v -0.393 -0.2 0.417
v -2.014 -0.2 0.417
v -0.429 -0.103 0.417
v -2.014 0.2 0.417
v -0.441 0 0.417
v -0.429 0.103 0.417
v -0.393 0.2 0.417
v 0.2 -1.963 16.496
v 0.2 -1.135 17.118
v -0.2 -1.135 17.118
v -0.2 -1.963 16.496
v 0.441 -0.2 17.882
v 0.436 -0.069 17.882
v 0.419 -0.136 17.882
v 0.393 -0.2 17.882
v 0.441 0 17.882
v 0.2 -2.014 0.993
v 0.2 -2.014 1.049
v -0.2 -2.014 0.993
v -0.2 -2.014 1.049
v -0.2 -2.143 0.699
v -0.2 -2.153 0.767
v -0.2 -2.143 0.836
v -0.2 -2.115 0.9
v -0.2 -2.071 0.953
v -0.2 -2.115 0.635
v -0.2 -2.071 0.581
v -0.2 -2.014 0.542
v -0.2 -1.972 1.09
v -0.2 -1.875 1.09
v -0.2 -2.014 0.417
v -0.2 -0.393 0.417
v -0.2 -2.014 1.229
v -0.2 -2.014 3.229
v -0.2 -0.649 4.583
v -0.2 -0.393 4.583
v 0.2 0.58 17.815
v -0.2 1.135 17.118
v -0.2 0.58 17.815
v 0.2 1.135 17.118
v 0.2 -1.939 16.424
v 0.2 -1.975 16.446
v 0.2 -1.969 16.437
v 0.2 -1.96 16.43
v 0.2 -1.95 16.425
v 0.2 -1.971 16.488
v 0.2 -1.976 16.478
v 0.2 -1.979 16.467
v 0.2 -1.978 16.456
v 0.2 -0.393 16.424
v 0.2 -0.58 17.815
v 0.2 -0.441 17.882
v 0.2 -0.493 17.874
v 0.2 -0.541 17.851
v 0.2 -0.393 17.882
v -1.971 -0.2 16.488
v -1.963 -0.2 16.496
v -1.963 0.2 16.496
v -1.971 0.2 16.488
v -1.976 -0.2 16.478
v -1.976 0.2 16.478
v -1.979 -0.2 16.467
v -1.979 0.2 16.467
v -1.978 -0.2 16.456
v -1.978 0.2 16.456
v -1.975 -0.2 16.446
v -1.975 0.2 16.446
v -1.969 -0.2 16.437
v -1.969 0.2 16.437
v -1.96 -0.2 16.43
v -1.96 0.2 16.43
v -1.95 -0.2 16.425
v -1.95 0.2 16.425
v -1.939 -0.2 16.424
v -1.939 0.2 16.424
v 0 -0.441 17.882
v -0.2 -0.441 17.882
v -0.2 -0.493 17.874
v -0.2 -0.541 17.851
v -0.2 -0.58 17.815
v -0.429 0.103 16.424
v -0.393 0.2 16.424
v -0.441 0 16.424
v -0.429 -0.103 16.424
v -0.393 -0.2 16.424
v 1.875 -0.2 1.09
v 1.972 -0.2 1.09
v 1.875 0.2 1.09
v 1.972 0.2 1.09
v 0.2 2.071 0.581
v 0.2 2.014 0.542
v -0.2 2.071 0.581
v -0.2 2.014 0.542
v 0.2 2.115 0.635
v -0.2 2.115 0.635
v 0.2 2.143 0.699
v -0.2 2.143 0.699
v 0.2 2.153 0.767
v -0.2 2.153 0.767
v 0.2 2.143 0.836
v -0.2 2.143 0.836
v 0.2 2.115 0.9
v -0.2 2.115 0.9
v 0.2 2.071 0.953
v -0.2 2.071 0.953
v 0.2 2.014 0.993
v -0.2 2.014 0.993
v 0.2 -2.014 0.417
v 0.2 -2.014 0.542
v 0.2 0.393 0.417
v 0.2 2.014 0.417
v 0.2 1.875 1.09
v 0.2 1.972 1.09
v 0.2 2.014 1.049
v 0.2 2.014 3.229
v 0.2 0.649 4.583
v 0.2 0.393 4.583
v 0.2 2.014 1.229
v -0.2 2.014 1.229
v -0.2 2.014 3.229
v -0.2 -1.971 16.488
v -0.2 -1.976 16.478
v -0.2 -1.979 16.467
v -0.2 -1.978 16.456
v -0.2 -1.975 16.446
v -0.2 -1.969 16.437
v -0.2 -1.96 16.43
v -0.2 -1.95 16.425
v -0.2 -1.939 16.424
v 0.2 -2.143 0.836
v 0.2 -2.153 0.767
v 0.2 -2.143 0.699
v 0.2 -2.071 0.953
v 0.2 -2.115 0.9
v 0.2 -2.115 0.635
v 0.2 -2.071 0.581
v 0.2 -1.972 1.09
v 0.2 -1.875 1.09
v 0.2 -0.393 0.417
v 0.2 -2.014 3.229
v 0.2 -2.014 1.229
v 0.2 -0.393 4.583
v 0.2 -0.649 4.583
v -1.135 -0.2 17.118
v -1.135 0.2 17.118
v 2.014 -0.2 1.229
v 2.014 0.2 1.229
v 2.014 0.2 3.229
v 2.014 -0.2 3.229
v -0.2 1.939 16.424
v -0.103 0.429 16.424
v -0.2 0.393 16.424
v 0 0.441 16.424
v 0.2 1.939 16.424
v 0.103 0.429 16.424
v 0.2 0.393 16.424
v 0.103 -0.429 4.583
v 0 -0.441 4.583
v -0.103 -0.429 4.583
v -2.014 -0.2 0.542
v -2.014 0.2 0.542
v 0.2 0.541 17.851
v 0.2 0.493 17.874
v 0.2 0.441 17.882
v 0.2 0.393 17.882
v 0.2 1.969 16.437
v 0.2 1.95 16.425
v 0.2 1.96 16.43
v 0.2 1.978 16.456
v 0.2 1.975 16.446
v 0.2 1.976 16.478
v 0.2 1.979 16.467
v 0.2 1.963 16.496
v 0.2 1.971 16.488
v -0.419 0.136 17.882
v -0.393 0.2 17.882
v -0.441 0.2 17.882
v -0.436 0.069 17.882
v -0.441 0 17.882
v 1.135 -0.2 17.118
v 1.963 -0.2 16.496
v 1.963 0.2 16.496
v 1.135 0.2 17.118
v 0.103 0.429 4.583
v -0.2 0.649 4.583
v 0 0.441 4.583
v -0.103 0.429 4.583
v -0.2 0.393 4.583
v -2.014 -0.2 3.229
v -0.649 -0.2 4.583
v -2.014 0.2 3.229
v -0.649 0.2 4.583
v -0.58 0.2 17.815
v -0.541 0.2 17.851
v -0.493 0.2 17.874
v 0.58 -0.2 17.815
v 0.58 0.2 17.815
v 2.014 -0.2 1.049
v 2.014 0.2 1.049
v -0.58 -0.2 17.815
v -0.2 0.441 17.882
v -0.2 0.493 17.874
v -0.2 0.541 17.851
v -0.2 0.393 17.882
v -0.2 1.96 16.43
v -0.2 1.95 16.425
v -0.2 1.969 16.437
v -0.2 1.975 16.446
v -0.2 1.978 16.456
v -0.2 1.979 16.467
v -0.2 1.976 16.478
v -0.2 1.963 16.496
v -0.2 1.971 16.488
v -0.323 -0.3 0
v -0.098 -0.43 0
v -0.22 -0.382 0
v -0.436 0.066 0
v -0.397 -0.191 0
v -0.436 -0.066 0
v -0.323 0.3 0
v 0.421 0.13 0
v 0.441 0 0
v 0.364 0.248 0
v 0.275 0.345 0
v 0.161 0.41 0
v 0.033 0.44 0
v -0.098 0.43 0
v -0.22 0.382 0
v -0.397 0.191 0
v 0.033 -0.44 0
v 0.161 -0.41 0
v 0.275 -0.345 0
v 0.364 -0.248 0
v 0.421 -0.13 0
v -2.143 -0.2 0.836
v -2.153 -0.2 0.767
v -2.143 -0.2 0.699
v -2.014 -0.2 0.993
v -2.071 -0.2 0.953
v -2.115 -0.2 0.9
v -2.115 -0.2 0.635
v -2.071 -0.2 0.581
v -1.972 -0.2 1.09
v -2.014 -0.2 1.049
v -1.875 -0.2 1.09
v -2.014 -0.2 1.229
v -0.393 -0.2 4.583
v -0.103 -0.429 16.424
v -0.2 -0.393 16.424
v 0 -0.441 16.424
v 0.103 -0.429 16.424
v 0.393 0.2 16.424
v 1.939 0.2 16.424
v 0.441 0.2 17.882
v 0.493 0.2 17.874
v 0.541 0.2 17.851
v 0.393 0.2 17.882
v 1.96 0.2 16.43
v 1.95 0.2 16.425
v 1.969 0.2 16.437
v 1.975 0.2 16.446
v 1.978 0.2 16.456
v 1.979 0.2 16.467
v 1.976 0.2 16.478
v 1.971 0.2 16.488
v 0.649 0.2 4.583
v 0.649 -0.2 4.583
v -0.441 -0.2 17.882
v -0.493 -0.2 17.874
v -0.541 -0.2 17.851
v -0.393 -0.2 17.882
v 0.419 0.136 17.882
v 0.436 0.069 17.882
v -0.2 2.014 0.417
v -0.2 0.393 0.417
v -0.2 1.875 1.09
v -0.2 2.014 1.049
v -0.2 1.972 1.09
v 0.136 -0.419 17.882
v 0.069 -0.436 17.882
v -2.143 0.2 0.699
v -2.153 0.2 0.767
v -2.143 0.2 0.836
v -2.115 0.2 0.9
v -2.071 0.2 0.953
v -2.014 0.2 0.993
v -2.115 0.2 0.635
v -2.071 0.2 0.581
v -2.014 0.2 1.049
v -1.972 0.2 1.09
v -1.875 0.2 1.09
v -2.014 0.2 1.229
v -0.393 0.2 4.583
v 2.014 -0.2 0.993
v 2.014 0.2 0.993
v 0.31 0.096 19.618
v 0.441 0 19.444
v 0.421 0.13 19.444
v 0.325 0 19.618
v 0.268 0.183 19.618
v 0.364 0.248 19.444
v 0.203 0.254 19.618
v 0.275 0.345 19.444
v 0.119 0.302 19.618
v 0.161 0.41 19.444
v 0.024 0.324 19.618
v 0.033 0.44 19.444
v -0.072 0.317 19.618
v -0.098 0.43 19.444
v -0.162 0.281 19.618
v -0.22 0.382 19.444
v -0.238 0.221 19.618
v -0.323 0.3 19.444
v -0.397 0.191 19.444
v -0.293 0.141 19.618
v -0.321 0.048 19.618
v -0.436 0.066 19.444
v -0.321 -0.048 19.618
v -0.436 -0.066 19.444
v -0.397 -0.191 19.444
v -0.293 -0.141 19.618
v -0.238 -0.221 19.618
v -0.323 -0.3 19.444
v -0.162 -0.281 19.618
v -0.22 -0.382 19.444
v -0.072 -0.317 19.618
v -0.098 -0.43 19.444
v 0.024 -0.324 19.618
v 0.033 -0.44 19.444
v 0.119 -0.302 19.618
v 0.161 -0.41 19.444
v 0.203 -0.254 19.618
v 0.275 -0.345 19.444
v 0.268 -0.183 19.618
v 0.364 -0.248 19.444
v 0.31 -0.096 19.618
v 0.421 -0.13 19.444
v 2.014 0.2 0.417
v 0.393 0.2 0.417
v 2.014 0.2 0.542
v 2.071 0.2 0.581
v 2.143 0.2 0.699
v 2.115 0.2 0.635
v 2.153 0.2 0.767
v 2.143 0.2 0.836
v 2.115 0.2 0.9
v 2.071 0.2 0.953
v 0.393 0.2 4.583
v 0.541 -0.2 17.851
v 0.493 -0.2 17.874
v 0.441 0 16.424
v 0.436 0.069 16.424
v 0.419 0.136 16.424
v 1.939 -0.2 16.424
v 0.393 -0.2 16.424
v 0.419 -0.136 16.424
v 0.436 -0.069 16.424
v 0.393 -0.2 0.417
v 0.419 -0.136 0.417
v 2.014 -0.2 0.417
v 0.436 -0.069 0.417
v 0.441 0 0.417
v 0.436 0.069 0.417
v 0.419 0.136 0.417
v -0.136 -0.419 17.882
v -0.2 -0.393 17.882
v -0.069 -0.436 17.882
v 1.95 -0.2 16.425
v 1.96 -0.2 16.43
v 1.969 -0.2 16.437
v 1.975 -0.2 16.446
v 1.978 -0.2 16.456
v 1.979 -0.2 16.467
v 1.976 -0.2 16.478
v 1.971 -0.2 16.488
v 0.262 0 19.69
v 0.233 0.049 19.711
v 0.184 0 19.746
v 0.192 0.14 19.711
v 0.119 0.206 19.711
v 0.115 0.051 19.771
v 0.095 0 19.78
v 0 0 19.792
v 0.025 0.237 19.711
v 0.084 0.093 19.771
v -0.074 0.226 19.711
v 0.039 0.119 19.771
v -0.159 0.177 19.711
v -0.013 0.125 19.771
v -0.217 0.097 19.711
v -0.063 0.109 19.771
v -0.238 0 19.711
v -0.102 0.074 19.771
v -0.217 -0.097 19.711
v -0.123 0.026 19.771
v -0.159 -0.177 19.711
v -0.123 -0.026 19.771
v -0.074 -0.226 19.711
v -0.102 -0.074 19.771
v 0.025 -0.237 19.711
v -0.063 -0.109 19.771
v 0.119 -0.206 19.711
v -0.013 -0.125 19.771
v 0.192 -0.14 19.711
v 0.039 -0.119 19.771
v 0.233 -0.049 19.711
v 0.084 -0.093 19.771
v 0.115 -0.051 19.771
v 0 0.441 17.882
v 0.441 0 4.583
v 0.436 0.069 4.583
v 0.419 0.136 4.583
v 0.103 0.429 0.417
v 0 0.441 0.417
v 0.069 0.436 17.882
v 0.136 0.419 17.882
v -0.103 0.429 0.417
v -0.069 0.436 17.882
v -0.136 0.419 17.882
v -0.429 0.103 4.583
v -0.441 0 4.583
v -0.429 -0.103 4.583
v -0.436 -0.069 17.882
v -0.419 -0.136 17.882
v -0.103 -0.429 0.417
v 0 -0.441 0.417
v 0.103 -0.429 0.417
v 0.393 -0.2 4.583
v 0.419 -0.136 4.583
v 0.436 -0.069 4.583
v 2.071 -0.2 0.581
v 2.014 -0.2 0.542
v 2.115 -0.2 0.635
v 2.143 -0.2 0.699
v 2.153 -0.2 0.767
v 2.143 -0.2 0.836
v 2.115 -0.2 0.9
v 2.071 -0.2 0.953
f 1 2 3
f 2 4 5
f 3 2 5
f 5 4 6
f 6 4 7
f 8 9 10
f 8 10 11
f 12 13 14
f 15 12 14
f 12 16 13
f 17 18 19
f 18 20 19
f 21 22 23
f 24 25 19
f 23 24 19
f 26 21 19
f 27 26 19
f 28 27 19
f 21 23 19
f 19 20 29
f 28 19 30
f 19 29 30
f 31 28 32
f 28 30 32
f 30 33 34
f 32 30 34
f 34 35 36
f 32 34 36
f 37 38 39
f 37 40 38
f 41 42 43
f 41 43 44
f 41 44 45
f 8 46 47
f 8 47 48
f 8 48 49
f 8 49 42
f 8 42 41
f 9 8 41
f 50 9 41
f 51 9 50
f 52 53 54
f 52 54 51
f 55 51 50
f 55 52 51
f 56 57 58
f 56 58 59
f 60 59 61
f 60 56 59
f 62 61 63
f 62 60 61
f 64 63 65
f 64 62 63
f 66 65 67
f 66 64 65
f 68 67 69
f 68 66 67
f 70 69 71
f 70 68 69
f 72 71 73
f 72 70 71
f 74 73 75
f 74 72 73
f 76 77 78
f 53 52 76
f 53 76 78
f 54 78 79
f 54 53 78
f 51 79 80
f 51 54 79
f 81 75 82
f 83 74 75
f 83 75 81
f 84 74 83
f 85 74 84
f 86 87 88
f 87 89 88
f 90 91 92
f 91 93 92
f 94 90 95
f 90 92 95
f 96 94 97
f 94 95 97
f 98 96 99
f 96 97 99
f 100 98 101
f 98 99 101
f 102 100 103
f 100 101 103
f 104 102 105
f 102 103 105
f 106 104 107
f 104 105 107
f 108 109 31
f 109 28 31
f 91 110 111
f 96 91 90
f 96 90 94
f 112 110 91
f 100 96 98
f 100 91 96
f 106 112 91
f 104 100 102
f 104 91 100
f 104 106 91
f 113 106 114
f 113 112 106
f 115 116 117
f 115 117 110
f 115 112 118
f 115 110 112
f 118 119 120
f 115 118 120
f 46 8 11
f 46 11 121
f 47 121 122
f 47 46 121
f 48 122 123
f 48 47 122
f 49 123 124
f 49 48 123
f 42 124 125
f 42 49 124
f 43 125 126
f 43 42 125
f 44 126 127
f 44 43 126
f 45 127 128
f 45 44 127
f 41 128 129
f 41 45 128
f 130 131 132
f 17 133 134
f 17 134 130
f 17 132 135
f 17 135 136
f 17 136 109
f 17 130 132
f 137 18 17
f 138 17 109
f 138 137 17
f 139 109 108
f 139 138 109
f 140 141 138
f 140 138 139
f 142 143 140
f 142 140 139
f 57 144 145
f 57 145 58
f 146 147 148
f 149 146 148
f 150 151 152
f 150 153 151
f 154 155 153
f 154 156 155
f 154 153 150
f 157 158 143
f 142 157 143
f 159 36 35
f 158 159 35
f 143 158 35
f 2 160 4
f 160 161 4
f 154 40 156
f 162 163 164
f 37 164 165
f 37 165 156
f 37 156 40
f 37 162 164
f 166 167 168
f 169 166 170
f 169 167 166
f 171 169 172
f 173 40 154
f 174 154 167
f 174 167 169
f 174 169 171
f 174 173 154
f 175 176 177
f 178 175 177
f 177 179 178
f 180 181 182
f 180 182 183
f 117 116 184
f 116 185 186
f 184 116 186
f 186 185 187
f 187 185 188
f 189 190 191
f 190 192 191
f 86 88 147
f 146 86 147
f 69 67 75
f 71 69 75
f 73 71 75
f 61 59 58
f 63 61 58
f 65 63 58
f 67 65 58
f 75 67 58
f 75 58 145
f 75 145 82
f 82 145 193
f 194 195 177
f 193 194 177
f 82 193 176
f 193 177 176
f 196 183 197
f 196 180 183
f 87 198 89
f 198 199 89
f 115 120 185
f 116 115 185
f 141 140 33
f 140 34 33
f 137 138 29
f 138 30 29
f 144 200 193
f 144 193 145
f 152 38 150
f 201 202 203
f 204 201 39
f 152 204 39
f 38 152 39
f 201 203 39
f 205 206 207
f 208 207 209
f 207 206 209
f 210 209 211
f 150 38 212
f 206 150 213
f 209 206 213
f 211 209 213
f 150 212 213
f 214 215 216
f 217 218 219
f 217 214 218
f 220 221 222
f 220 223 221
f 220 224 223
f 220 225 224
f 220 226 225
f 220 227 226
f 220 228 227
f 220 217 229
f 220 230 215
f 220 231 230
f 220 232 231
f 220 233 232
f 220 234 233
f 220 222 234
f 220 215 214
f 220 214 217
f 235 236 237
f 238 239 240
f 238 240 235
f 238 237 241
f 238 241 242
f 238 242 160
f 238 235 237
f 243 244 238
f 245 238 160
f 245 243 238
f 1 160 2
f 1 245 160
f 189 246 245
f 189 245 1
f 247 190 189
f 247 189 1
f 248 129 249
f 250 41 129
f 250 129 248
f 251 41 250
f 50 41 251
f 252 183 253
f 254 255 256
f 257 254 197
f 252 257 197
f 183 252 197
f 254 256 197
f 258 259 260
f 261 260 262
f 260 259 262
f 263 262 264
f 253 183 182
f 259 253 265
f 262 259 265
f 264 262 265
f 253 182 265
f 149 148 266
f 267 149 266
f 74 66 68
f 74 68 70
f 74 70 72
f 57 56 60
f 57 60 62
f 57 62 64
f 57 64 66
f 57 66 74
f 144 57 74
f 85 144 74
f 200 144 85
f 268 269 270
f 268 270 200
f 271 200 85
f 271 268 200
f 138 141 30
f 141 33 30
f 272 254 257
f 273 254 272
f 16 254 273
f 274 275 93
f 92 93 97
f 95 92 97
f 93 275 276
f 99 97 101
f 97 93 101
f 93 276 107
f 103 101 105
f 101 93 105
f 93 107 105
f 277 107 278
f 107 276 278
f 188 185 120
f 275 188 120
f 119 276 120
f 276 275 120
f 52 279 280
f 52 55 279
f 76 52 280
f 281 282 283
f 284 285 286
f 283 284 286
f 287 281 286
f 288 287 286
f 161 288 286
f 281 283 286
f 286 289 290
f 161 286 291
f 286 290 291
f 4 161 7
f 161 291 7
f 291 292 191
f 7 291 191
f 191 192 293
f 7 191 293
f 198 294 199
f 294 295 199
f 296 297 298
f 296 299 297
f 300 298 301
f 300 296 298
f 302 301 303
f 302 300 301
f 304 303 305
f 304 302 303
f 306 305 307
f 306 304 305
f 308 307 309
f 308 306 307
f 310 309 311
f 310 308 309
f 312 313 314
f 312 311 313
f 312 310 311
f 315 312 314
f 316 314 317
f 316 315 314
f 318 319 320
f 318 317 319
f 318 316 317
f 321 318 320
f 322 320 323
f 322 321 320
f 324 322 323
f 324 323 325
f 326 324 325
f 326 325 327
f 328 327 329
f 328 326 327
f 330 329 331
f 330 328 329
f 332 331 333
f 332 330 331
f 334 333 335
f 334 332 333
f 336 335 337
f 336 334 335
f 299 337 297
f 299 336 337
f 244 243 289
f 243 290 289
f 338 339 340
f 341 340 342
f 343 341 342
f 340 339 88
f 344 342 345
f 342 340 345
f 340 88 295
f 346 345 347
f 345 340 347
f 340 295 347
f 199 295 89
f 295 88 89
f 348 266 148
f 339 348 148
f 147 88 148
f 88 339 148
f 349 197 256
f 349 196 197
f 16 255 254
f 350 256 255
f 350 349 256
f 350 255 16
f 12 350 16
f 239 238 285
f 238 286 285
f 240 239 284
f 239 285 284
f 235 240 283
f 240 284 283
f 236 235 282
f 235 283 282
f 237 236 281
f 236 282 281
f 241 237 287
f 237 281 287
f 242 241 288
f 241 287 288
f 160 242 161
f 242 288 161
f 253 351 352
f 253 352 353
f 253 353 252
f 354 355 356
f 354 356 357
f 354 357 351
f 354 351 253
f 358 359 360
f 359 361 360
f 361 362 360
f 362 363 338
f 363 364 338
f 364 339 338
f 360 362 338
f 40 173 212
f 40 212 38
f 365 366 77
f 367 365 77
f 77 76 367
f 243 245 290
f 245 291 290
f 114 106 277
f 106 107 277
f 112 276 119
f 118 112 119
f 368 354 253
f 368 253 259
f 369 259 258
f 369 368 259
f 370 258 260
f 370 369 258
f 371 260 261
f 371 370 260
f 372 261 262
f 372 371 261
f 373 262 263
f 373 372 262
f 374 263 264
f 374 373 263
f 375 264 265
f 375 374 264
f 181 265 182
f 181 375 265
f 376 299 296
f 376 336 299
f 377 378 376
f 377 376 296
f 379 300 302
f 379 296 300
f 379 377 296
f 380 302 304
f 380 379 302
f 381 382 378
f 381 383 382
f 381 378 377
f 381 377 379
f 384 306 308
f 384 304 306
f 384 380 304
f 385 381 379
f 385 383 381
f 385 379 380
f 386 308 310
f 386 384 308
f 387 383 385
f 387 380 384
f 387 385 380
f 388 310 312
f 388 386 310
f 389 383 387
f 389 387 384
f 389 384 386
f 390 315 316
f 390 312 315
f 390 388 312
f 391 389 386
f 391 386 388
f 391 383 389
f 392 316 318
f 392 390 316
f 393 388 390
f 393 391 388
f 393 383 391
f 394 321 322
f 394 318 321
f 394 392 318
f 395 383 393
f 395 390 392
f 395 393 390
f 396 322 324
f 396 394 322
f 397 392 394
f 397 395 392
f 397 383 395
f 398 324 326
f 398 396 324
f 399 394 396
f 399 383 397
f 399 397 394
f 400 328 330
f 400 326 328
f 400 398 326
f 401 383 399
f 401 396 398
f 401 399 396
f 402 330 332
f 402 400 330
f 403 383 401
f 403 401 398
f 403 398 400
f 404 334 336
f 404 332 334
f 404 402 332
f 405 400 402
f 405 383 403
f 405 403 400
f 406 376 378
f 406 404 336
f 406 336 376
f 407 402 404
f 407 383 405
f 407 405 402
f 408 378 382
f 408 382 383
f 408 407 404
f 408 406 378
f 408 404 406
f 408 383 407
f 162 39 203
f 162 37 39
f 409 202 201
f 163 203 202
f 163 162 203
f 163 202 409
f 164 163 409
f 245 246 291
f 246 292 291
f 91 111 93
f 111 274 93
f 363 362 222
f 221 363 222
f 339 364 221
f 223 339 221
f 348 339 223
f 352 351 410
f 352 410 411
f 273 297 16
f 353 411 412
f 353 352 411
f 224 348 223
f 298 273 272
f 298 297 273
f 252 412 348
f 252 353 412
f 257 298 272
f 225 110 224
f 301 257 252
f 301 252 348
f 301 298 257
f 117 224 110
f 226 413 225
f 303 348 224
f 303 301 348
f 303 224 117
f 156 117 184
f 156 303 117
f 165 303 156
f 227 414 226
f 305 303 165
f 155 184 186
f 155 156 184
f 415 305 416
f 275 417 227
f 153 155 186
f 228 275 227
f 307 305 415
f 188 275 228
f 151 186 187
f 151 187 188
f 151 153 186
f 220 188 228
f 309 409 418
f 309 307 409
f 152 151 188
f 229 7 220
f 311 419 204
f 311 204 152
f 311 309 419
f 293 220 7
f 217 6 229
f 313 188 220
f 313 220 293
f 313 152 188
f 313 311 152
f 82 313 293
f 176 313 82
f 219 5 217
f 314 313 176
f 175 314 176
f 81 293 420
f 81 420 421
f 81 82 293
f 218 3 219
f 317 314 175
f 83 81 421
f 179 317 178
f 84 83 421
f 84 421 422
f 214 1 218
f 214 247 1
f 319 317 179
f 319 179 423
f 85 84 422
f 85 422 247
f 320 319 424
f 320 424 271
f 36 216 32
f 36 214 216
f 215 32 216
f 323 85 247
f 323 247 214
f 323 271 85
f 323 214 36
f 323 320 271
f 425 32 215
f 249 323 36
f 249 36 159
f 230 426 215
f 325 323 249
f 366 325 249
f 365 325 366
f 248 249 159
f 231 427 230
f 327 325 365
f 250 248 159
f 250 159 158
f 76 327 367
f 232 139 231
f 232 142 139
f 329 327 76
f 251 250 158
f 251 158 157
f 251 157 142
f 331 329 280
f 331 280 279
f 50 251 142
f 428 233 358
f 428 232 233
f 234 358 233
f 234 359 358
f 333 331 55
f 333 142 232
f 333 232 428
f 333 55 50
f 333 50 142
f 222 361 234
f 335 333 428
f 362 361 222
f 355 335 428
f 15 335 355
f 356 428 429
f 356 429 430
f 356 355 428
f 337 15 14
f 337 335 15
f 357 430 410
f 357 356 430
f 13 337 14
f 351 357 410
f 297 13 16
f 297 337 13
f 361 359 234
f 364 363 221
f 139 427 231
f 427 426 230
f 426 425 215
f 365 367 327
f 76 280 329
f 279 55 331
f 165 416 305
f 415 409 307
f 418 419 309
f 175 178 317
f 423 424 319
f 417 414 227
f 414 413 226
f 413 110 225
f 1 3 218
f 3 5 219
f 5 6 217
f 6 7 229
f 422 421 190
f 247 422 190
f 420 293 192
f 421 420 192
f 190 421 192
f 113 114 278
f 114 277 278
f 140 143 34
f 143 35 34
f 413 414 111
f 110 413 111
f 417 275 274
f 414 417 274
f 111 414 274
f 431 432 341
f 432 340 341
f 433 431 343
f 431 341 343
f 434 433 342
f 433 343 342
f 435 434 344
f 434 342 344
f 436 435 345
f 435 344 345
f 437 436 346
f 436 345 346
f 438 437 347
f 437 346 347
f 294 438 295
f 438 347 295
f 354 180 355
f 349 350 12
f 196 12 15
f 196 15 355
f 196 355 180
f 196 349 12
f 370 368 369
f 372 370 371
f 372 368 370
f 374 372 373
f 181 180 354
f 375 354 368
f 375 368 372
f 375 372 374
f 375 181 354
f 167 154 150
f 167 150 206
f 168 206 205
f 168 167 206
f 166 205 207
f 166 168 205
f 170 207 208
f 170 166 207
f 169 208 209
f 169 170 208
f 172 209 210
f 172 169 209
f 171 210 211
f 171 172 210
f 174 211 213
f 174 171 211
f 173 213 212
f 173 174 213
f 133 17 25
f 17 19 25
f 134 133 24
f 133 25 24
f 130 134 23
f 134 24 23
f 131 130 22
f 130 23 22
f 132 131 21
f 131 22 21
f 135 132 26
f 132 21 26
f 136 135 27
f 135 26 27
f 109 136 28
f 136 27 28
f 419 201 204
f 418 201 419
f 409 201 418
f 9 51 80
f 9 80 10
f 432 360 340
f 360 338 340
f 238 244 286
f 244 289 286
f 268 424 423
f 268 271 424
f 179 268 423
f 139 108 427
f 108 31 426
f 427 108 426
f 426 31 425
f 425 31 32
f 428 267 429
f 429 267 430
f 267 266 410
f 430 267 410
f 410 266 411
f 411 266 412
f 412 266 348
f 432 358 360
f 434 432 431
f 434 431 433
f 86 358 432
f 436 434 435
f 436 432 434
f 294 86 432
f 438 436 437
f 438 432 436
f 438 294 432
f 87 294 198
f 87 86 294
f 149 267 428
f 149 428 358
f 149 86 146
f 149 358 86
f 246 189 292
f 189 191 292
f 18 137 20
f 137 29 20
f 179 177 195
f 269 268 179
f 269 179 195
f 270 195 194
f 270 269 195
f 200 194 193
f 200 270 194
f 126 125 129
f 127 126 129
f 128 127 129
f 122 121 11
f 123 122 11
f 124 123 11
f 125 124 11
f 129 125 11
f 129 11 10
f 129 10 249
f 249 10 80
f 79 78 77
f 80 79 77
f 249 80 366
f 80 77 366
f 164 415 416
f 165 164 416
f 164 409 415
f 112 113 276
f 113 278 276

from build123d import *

# Parameters (mm, degrees)
F3_DEPTH = 0.2
F5_COUNT = 4


# Not quite as in the source:
# - a feature of the source that left no trace in its solid (it failed there, or was rolled back) is left out


with BuildPart() as f1:
    # F0 (on Front) → F1 (revolve)
    with BuildSketch(Plane.XZ):
        with BuildLine():
            Line((0, 19.7916666667), (0, 0))
            Line((0, 0), (0.4409722222, 0))
            Line((0.4409722222, 0), (0.4409722222, 19.4444444444))
            Line((0.4409722222, 19.4444444444), (0.3249042511, 19.6180555556))
            ThreePointArc((0.3249042511, 19.6180555556), (0.1841898411, 19.745542126), (0, 19.7916666667))
        make_face()
    revolve(axis=Axis((0, 0, 9.8958333333), (0, 0, 1)))

    # F2 (on Front) → F3 (join, symmetric)
    with BuildSketch(Plane.XZ):
        with BuildLine():
            Line((2.0138888889, 3.2291666667), (0.6493055556, 4.5833333333))
            Line((0.6493055556, 4.5833333333), (-0.6493055556, 4.5833333333))
            Line((-0.6493055556, 4.5833333333), (-2.0138888889, 3.2291666667))
            Line((-2.0138888889, 3.2291666667), (-2.0138888889, 1.2291666667))
            Line((-2.0138888889, 1.2291666667), (-1.875, 1.0902777778))
            Line((-1.875, 1.0902777778), (-1.9722222222, 1.0902777778))
            Line((-1.9722222222, 1.0902777778), (-2.0138888889, 1.0486111111))
            Line((-2.0138888889, 1.0486111111), (-2.0138888889, 0.9930555556))
            ThreePointArc((-2.0138888889, 0.9930555556), (-2.1527777778, 0.7673611111), (-2.0138888889, 0.5416666667))
            Line((-2.0138888889, 0.5416666667), (-2.0138888889, 0.4166666667))
            Line((-2.0138888889, 0.4166666667), (2.0138888889, 0.4166666667))
            Line((2.0138888889, 0.4166666667), (2.0138888889, 0.5416666667))
            ThreePointArc((2.0138888889, 0.5416666667), (2.1527777778, 0.7673611111), (2.0138888889, 0.9930555556))
            Line((2.0138888889, 0.9930555556), (2.0138888889, 1.0486111111))
            Line((2.0138888889, 1.0486111111), (1.9722222222, 1.0902777778))
            Line((1.9722222222, 1.0902777778), (1.875, 1.0902777778))
            Line((1.875, 1.0902777778), (2.0138888889, 1.2291666667))
            Line((2.0138888889, 1.2291666667), (2.0138888889, 3.2291666667))
        make_face()
        with BuildLine():
            Line((0.4409722222, 17.8819444444), (-0.4409722222, 17.8819444444))
            ThreePointArc((-0.4409722222, 17.8819444444), (-0.5180541376, 17.8643461976), (-0.5798611111, 17.8150388148))
            Line((-0.5798611111, 17.8150388148), (-1.1354166667, 17.1180555556))
            Line((-1.1354166667, 17.1180555556), (-1.9632069856, 16.4955808322))
            ThreePointArc((-1.9632069856, 16.4955808322), (-1.9771060186, 16.4509380855), (-1.9391666667, 16.4236111111))
            Line((-1.9391666667, 16.4236111111), (1.9391666667, 16.4236111111))
            ThreePointArc((1.9391666667, 16.4236111111), (1.9771060186, 16.4509380855), (1.9632069856, 16.4955808322))
            Line((1.9632069856, 16.4955808322), (1.1354166667, 17.1180555556))
            Line((1.1354166667, 17.1180555556), (0.5798611111, 17.8150388148))
            ThreePointArc((0.5798611111, 17.8150388148), (0.5180541376, 17.8643461976), (0.4409722222, 17.8819444444))
        make_face()
    extrude(amount=F3_DEPTH, both=True)

    # F5: F1 ×4 about axis
    f5_axis = Axis((0, 0, 0), (0, 0, 1))


with BuildPart() as f1_1:
    add(f1.part)
    for i in range(1, F5_COUNT):
        add(f1.part.rotate(f5_axis, i * 360 / F5_COUNT))


solid = f1_1.part
